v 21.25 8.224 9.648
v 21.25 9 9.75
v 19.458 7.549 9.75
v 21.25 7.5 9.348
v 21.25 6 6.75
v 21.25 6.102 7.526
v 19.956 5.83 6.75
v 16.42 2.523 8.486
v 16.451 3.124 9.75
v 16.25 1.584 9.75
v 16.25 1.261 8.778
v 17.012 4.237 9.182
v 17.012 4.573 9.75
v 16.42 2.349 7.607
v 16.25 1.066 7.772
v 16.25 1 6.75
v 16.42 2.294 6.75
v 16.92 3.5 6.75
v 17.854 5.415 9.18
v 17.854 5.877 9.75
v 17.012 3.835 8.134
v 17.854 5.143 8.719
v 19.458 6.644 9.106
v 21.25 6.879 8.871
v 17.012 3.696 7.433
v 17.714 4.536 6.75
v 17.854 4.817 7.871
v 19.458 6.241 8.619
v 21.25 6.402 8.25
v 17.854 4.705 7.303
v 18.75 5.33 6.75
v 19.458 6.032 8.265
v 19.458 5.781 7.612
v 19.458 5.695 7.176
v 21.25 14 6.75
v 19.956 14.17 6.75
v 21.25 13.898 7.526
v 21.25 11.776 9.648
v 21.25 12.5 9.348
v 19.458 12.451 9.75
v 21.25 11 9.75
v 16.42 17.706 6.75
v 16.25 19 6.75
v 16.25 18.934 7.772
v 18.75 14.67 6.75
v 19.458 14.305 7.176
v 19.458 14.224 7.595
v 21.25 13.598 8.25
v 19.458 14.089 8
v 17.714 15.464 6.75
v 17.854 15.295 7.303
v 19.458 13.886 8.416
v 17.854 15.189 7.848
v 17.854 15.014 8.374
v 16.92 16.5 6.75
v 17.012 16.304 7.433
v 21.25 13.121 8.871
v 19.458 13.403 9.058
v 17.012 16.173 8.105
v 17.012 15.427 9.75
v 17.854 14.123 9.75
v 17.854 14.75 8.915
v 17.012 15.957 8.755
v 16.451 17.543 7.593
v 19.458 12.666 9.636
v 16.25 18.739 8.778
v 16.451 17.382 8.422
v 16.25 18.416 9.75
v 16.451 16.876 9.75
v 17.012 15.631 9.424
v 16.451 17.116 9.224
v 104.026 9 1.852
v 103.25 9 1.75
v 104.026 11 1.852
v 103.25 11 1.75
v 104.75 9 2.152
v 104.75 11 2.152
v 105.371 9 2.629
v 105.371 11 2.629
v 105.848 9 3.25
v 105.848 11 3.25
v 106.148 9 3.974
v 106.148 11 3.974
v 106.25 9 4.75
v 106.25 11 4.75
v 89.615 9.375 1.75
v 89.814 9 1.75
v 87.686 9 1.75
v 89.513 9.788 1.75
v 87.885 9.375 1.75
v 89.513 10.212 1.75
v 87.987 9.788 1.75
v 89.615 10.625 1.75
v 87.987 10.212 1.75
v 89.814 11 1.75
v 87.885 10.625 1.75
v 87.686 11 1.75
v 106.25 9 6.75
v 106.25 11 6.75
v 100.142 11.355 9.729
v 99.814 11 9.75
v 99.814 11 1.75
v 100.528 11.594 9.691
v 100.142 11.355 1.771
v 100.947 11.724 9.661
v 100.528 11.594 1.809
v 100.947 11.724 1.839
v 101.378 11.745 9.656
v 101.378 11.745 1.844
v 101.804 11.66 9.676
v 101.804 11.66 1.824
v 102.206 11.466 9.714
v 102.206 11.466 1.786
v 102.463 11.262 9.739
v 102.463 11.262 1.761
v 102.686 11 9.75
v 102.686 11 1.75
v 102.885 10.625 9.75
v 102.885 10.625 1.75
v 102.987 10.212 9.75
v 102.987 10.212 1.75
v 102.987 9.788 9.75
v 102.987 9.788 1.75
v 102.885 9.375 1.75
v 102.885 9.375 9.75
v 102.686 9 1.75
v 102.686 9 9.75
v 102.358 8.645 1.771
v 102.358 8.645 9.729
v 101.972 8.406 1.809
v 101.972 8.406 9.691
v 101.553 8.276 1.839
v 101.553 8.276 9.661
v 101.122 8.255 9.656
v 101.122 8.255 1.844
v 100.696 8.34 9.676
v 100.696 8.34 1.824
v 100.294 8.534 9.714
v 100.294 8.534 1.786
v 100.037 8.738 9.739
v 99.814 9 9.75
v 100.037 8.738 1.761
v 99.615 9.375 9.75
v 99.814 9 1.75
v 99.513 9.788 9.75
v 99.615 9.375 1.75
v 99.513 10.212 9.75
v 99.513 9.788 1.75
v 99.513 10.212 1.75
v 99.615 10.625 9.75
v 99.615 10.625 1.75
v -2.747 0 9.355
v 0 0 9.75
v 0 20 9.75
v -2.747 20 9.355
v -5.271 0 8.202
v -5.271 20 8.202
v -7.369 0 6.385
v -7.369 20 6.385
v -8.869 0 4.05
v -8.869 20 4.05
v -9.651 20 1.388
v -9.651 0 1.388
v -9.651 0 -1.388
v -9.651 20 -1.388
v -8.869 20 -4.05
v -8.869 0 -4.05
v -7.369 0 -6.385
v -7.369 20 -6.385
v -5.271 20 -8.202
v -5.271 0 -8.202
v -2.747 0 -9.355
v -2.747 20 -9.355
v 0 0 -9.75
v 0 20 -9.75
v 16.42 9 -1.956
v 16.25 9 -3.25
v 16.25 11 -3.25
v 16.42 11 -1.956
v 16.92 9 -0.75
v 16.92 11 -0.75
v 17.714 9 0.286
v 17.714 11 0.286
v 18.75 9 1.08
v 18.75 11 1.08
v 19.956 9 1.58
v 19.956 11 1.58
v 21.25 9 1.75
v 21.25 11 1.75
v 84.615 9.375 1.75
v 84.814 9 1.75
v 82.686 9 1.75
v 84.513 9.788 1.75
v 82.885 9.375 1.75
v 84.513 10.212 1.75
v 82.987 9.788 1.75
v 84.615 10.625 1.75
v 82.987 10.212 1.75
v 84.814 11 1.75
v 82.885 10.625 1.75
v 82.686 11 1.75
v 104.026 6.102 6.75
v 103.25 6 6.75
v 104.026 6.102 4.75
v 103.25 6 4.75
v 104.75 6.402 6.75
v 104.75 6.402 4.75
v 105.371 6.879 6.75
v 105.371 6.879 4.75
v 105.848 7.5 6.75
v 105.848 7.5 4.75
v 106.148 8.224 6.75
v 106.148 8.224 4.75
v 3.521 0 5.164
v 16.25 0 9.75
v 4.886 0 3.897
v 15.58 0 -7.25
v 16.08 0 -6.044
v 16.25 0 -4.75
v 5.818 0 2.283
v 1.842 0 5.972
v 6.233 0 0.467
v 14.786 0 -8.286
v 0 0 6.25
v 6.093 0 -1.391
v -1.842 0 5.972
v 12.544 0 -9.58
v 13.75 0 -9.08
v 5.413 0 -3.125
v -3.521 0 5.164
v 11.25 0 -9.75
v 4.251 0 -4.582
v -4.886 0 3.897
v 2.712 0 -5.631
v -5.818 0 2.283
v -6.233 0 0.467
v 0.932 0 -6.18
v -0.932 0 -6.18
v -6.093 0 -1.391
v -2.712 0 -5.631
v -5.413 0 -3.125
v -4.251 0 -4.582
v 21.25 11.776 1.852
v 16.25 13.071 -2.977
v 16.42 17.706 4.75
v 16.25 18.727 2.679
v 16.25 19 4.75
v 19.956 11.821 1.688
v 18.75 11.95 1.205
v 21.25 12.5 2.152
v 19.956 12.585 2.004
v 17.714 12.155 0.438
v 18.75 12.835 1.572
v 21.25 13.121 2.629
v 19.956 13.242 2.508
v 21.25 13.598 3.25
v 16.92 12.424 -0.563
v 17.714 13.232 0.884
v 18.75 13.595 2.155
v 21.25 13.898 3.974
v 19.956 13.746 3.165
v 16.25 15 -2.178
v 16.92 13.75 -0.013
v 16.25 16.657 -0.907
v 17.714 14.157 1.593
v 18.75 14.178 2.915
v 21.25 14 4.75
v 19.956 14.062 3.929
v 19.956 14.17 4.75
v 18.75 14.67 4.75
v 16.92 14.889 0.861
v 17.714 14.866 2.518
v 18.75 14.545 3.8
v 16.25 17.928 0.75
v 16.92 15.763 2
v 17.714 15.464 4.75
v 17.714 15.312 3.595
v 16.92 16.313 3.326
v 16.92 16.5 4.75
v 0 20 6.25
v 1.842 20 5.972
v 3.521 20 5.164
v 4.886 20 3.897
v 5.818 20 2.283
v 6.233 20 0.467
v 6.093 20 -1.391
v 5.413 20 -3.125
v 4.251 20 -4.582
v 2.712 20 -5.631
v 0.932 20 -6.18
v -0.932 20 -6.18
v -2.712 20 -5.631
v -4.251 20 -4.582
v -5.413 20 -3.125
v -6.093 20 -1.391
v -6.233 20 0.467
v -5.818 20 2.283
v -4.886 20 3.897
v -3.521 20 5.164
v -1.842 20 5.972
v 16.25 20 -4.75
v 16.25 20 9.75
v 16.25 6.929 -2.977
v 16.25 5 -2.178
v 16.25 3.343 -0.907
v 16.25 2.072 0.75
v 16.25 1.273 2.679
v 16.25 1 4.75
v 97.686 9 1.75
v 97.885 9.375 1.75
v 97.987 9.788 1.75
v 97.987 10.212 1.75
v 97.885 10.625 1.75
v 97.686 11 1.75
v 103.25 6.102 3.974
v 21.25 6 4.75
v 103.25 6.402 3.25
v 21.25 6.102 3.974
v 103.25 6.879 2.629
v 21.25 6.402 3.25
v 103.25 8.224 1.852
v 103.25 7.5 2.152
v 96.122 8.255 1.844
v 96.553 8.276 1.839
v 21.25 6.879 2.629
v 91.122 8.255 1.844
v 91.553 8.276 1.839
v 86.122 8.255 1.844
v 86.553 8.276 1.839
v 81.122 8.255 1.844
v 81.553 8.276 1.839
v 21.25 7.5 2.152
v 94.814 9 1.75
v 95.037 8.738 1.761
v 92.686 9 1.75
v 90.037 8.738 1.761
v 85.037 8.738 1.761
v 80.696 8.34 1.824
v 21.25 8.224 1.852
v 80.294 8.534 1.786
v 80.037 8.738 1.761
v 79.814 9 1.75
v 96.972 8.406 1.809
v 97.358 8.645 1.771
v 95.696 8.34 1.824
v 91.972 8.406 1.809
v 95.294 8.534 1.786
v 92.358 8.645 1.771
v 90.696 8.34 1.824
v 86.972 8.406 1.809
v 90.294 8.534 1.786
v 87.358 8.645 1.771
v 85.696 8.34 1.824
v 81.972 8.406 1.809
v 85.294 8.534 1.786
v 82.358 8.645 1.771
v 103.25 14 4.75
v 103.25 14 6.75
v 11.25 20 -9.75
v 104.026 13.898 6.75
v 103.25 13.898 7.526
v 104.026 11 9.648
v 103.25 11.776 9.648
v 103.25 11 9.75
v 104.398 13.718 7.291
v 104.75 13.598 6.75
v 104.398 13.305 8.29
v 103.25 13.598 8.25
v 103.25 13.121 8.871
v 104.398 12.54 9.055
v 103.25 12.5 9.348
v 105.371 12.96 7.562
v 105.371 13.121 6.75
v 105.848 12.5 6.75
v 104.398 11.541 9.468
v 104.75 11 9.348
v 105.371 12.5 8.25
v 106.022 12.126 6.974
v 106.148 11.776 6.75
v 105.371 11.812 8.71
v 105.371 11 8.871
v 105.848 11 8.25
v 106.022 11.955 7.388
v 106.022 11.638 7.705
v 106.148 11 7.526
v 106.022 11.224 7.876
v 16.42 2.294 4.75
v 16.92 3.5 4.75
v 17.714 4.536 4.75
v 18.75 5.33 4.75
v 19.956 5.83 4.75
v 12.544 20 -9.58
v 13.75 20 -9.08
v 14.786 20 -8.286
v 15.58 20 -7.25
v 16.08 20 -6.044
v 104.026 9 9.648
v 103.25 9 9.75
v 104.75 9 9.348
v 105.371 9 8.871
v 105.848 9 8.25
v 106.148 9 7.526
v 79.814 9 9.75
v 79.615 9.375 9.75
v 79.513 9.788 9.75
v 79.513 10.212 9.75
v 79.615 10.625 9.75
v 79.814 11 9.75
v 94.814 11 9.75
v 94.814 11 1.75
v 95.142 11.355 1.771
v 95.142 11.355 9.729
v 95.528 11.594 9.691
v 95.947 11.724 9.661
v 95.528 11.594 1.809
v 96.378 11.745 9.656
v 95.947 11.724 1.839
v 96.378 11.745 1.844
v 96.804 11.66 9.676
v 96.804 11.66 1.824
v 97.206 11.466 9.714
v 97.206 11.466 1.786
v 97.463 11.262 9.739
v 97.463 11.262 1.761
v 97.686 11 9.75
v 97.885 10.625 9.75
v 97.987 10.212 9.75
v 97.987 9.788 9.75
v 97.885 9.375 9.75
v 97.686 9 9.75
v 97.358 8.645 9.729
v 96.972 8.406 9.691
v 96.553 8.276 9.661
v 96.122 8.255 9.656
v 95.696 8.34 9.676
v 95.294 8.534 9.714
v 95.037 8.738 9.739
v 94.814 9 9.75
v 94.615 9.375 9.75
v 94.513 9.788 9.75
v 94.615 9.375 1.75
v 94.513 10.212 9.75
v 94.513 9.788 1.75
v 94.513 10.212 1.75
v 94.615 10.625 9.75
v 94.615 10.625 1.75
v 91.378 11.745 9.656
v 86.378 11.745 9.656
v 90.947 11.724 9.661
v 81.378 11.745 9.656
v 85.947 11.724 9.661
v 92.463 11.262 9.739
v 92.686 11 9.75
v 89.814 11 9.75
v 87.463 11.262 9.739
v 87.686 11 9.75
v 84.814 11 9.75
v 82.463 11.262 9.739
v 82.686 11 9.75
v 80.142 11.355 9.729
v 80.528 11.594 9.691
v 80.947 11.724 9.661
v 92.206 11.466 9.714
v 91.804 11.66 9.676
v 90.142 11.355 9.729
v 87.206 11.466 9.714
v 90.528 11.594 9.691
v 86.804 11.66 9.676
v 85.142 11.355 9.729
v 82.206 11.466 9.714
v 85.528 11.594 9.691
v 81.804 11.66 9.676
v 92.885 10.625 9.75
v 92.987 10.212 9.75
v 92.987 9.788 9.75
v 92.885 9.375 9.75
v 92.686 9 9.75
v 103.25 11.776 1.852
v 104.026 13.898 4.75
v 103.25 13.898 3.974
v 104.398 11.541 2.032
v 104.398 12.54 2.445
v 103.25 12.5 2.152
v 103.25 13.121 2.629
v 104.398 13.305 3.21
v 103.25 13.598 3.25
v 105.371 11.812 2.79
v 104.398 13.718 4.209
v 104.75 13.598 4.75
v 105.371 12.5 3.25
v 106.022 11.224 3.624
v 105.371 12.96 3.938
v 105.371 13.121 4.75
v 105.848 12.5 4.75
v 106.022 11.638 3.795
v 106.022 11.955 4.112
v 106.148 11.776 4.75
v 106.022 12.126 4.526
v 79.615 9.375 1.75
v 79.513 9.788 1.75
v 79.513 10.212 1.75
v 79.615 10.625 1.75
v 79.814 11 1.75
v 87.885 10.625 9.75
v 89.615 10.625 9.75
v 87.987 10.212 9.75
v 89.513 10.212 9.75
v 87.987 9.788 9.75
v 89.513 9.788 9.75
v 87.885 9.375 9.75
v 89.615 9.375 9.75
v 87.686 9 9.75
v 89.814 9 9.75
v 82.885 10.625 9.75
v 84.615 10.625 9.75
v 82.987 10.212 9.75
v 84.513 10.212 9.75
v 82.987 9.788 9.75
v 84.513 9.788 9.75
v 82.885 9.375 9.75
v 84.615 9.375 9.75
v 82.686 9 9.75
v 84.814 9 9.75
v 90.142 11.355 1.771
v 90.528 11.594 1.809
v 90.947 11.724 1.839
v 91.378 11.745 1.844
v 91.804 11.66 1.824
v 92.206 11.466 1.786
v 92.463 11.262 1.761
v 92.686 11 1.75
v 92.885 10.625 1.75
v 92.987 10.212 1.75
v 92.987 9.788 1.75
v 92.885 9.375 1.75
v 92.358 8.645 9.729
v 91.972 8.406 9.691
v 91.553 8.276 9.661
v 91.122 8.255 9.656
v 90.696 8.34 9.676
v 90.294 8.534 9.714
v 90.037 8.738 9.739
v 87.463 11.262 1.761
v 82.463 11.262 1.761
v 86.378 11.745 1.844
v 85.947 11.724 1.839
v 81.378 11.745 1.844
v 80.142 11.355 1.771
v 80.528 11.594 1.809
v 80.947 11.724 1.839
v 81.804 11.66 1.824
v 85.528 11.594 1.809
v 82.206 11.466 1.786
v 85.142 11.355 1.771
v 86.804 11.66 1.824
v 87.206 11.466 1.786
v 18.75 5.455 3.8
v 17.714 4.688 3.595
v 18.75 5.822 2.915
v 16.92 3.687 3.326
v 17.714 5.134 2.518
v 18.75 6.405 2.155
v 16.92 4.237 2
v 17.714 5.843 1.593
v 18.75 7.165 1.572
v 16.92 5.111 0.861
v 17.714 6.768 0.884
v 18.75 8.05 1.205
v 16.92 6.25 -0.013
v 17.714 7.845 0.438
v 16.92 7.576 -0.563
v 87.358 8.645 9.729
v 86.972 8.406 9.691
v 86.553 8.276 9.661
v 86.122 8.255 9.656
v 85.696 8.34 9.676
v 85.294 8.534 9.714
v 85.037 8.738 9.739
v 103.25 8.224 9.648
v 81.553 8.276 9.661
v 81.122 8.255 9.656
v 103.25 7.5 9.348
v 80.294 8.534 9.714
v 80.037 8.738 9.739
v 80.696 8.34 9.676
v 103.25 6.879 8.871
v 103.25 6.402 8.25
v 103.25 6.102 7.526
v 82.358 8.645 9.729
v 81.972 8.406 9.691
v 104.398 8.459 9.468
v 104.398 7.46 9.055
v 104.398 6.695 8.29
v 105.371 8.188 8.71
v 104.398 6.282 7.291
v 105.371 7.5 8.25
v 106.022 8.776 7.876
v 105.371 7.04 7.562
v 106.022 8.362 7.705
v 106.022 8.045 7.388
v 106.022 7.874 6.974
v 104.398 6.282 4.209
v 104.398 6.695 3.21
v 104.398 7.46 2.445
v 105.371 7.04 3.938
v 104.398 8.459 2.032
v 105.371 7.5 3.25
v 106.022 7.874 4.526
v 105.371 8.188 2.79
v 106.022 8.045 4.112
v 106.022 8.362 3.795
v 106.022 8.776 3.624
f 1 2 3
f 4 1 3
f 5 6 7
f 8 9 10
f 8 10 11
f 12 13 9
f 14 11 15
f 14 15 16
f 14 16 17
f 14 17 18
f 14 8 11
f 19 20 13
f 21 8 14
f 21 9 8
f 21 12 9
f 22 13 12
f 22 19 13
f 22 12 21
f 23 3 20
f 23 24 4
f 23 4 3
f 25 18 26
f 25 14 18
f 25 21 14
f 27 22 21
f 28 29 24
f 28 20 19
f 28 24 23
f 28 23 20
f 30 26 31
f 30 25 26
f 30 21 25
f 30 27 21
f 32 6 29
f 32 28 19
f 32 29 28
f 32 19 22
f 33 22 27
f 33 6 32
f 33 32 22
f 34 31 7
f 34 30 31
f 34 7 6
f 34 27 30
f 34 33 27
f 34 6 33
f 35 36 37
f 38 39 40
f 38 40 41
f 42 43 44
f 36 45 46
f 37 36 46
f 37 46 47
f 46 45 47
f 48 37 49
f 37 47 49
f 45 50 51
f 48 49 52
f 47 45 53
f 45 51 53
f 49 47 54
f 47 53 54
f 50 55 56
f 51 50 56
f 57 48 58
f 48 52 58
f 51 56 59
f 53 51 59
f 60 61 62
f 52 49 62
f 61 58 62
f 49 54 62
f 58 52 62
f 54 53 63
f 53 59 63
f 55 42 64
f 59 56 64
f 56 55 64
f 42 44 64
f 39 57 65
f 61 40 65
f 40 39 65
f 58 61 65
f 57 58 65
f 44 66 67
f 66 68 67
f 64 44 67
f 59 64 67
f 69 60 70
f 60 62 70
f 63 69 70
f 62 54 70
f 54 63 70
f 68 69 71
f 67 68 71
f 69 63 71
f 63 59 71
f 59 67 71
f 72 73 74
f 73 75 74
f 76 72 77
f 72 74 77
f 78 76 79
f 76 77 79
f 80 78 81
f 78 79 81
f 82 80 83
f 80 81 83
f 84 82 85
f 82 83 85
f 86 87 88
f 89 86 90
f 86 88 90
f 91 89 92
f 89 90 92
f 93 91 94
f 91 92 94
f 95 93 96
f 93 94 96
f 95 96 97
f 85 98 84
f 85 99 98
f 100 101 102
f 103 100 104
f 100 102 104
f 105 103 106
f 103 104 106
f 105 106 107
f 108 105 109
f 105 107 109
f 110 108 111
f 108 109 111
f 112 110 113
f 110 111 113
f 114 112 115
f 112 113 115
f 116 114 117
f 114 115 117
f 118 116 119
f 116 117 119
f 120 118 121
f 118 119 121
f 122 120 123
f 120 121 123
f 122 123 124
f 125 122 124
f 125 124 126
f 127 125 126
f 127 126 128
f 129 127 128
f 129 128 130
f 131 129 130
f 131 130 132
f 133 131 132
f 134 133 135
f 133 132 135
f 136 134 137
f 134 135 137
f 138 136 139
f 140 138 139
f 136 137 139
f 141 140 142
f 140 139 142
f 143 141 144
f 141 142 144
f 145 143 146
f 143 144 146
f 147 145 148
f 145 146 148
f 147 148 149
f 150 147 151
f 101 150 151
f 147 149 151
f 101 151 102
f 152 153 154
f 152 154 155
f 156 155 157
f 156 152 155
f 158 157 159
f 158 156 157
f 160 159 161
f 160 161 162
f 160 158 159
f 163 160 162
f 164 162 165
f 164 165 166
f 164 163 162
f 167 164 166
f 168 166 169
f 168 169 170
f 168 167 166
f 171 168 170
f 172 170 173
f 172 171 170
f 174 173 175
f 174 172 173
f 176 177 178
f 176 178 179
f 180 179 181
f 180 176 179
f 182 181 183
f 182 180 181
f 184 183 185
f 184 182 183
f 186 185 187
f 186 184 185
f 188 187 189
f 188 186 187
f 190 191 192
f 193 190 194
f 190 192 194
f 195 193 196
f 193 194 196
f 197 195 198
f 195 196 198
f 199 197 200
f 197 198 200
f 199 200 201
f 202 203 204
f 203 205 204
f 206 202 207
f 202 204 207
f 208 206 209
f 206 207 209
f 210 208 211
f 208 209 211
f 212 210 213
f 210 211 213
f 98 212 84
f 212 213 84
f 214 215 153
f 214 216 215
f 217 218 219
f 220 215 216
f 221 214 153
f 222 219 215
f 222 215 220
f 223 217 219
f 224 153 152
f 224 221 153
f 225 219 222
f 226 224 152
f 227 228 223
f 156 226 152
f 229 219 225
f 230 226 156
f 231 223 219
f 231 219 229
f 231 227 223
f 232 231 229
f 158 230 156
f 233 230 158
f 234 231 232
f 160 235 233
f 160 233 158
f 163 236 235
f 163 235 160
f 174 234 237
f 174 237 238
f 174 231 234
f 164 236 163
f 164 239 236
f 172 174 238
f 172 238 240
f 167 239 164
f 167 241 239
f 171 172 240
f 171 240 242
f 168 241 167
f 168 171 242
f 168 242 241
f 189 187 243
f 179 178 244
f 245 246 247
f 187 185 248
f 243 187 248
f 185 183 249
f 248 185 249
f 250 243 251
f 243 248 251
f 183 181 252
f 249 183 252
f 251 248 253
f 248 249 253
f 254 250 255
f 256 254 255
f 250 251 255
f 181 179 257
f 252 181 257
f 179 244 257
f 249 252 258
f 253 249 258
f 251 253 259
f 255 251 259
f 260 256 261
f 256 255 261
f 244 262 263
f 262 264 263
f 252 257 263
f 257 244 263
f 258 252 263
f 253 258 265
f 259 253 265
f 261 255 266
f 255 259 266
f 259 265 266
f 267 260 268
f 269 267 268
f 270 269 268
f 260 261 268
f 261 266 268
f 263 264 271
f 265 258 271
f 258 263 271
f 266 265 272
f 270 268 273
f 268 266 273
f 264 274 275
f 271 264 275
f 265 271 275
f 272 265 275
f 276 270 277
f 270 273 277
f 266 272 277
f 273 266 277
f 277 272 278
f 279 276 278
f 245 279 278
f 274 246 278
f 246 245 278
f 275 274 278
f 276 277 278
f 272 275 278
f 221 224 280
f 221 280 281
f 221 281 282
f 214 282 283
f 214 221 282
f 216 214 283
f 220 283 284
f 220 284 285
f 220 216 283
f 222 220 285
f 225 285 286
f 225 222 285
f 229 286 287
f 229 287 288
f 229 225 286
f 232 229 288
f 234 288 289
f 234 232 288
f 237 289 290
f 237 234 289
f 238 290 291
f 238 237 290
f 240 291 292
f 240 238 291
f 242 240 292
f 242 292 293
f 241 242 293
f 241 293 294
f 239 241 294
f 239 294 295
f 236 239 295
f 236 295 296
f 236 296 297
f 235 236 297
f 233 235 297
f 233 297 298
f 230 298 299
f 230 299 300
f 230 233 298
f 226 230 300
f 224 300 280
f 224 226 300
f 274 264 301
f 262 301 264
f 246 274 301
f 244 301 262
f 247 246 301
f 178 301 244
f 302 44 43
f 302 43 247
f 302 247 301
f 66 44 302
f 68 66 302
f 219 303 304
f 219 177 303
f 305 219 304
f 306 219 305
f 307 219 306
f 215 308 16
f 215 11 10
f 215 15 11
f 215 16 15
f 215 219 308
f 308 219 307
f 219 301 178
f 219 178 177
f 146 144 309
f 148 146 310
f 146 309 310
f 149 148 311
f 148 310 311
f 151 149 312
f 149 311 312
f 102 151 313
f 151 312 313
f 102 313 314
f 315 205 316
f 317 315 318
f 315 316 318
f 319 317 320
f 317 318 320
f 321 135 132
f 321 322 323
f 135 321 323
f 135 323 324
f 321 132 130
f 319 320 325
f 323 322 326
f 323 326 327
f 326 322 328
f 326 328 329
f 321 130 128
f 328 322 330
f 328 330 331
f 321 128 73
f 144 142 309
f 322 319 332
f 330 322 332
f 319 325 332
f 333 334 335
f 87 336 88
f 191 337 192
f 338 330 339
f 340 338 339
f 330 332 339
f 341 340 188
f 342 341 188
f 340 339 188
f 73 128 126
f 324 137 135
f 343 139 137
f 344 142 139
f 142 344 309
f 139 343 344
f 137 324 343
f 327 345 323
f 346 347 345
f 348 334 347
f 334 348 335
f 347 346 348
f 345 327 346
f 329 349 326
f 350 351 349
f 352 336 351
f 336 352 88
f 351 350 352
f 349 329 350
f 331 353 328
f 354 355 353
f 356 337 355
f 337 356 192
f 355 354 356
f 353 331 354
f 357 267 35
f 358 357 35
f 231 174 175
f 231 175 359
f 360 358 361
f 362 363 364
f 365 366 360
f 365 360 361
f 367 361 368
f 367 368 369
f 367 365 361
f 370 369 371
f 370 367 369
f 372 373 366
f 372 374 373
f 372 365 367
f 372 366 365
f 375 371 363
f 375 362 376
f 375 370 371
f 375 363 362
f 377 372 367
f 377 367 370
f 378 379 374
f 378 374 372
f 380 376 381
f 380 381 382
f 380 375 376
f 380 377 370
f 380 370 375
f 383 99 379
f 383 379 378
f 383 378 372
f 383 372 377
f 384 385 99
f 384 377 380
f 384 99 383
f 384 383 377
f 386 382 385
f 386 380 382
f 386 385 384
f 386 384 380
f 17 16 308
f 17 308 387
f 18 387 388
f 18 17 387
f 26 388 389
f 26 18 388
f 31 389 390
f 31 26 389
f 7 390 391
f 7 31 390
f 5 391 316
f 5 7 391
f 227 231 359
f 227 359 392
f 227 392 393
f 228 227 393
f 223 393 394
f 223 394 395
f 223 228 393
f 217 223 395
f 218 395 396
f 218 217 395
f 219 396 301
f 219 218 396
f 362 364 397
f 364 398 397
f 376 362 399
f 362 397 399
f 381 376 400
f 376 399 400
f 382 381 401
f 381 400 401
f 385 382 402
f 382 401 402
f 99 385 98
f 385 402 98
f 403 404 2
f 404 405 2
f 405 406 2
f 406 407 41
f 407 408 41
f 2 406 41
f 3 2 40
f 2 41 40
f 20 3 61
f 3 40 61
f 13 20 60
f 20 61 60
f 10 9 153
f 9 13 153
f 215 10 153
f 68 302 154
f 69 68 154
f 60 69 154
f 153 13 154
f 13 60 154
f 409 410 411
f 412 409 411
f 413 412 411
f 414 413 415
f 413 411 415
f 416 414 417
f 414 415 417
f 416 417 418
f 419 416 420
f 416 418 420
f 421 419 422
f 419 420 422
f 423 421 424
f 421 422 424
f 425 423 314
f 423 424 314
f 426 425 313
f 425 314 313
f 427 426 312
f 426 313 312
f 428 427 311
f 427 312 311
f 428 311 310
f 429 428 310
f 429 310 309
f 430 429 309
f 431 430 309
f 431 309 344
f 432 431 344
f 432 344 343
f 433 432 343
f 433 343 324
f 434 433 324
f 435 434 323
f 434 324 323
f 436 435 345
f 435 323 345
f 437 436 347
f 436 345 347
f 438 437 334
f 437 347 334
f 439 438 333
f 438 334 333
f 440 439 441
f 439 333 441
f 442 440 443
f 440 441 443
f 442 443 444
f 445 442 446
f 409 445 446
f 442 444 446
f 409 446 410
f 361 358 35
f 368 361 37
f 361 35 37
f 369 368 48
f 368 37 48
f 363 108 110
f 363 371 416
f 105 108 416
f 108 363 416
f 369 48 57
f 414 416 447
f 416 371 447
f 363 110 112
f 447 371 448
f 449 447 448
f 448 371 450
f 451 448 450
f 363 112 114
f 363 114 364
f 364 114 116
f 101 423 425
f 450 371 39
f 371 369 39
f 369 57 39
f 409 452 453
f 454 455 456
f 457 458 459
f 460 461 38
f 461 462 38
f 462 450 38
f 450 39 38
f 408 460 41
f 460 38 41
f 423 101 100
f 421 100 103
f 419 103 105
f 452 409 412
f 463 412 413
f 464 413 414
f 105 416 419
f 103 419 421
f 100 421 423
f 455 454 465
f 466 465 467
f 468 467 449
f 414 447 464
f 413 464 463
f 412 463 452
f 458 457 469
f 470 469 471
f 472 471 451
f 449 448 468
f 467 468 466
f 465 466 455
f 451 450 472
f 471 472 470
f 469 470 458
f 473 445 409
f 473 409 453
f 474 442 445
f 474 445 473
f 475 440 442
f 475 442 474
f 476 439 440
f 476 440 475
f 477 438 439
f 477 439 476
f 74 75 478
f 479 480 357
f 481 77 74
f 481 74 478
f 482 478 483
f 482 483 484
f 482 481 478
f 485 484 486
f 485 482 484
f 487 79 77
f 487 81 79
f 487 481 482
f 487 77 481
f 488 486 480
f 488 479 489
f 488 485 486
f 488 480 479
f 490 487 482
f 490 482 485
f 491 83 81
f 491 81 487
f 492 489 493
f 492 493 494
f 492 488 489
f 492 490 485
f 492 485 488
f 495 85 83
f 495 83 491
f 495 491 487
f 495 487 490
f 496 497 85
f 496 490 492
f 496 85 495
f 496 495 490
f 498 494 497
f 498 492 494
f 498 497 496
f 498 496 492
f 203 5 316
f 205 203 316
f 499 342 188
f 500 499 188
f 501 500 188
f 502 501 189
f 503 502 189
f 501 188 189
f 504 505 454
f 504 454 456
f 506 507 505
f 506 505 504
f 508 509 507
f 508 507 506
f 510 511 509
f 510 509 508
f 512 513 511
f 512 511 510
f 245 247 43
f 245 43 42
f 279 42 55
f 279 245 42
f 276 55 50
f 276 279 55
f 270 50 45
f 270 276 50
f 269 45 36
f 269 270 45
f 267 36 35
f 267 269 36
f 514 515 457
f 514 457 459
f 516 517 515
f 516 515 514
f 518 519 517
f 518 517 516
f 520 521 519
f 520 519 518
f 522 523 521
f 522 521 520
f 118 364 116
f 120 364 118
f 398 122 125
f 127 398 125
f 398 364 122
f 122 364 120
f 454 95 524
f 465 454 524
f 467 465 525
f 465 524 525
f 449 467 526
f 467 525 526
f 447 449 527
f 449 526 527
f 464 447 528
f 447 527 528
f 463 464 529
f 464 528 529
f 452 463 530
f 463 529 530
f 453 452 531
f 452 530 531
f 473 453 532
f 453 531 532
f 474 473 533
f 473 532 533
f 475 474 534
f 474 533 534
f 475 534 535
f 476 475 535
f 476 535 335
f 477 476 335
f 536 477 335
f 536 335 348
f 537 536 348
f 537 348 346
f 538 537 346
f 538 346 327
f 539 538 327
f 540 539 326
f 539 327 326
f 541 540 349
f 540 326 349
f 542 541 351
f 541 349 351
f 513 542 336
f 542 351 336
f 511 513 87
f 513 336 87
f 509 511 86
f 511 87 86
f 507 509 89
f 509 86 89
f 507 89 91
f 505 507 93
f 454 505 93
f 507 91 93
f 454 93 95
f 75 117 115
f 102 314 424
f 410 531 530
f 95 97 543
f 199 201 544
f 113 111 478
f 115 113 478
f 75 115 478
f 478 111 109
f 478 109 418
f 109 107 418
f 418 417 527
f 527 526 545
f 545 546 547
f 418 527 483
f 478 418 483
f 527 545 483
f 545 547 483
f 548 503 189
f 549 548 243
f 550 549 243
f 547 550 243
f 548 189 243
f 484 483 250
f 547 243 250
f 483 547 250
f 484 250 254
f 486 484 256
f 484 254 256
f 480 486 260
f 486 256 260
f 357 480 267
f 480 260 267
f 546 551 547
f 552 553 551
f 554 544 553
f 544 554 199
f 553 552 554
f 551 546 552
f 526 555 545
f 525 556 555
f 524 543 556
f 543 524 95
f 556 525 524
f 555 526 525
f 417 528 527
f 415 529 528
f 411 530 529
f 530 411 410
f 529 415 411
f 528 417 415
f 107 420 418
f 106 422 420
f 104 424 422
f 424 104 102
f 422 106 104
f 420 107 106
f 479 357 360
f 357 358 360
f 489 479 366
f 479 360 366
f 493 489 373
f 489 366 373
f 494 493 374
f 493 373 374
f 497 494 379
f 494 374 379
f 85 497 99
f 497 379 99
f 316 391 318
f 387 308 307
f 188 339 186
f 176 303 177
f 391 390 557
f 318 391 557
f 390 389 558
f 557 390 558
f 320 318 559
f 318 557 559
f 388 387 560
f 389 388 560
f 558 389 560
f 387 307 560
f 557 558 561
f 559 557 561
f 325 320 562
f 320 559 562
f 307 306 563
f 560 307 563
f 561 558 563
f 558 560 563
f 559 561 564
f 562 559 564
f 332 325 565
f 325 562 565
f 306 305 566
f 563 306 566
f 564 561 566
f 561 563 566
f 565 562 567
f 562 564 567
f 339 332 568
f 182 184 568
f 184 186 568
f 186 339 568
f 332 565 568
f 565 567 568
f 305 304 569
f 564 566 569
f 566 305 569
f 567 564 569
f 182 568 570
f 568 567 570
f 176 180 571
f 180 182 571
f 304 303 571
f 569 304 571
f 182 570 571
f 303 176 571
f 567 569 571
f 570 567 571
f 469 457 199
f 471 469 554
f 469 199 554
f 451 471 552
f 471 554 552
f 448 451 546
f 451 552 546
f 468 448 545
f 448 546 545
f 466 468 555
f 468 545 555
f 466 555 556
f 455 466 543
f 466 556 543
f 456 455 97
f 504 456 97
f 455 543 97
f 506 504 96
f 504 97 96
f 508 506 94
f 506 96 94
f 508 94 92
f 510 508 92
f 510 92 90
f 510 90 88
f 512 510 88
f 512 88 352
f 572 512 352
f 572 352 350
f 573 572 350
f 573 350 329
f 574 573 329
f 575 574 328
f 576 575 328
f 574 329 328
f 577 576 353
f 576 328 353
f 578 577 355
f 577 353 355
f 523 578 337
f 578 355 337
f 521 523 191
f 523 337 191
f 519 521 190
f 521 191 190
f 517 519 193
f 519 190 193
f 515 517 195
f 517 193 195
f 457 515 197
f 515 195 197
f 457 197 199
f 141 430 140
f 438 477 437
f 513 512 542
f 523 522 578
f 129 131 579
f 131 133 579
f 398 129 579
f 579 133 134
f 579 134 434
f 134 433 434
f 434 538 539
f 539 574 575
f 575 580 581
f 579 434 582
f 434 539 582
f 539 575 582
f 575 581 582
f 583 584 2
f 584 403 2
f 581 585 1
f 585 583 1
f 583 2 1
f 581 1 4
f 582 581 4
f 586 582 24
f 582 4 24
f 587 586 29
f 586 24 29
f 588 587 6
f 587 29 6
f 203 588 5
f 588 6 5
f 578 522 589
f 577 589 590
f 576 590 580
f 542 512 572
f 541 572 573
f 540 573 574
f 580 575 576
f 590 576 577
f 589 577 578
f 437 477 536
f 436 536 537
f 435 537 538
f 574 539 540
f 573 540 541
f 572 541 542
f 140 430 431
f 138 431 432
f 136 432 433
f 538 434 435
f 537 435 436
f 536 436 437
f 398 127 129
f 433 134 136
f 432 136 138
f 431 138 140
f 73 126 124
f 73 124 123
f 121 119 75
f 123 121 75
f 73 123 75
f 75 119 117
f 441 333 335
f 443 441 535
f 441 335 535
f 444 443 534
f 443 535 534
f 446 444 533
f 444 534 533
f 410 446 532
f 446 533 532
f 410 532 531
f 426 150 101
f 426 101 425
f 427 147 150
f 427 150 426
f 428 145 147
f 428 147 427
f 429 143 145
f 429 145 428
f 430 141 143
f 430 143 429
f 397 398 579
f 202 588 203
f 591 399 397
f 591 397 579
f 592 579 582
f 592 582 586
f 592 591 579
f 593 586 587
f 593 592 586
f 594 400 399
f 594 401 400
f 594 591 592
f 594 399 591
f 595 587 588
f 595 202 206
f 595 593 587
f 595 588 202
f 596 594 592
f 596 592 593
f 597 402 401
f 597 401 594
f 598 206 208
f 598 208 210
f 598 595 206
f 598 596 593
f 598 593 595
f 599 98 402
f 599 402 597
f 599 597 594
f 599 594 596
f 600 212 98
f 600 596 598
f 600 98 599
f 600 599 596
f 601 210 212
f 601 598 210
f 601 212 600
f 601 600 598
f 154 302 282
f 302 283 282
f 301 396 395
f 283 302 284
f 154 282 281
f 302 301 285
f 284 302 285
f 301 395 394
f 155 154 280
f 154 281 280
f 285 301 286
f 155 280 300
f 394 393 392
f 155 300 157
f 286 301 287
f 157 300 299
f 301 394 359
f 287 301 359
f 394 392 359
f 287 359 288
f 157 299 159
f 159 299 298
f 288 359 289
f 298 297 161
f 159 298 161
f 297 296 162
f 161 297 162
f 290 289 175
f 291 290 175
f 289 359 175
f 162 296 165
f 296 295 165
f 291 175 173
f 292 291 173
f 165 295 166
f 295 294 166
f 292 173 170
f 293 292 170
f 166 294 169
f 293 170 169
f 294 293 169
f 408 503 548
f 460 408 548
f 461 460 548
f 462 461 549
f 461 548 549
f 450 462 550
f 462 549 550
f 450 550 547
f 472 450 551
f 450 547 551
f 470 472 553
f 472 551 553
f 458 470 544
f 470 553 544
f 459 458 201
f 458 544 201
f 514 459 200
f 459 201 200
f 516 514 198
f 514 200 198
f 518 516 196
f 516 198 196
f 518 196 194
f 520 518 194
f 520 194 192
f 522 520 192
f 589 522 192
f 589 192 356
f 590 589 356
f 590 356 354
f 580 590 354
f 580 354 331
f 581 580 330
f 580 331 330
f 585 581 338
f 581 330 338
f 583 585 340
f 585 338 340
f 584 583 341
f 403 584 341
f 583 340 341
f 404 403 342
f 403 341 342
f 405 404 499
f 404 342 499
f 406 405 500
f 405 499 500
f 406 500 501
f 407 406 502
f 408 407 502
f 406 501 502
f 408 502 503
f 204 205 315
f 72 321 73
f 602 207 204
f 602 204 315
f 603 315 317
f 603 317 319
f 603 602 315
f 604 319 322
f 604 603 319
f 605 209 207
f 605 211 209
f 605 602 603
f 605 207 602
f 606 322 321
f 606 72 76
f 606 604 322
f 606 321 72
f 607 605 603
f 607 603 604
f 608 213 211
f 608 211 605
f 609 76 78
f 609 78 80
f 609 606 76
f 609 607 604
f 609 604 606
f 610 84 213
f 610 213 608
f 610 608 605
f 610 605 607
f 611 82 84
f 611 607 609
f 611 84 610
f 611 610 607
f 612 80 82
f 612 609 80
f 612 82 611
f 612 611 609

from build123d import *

# Parameters (mm, degrees)
SKETCH1_R           = 6.25
BOSS_EXTRUDE1_DEPTH = 20
BOSS_EXTRUDE2_DEPTH = 90
SKETCH3_R           = 1.75
CUT_EXTRUDE1_DEPTH  = 109.72585939
FILLET1_R           = 3
FILLET2_R           = 5


with BuildPart() as part:
    # Sketch1 → Boss-Extrude1 (new body)
    with BuildSketch(Plane(origin=(0, 0, 0), x_dir=(1, 0, 0), z_dir=(0, 1, 0))):
        with BuildLine():
            Line((0, 9.75), (11.25, 9.75))
            ThreePointArc((11.25, 9.75), (14.785533906, 8.285533906), (16.25, 4.75))
            Line((16.25, 4.75), (16.25, -9.75))
            Line((16.25, -9.75), (0, -9.75))
            ThreePointArc((0, -9.75), (-9.75, 0), (0, 9.75))
        make_face()
        with Locations(Location((0, 0, 0), (0, 0, 270))):
            Circle(SKETCH1_R, mode=Mode.SUBTRACT)
    extrude(amount=BOSS_EXTRUDE1_DEPTH)

    # Sketch2 → Boss-Extrude2 (add)
    with BuildSketch(Plane(origin=(16.25, 0, 0), x_dir=(0, 0, -1), z_dir=(1, 0, 0))):
        with BuildLine():
            Line((-6.75, 6), (-4.75, 6))
            ThreePointArc((-4.75, 6), (-2.628679656, 6.878679656), (-1.75, 9))
            Line((-1.75, 9), (-1.75, 11))
            ThreePointArc((-1.75, 11), (-2.628679656, 13.121320344), (-4.75, 14))
            Line((-4.75, 14), (-6.75, 14))
            ThreePointArc((-6.75, 14), (-8.871320344, 13.121320344), (-9.75, 11))
            Line((-9.75, 11), (-9.75, 9))
            ThreePointArc((-9.75, 9), (-8.871320344, 6.878679656), (-6.75, 6))
        make_face()
    extrude(amount=BOSS_EXTRUDE2_DEPTH)

    # Sketch3 → Cut-Extrude1 (cut, through all)
    with BuildSketch(Plane(origin=(0, 0, 1.75), x_dir=(-1, 0, 0), z_dir=(0, 0, -1))):
        with Locations(Location((-101.25, 10, 0), (0, 0, 34.849904579))):
            Circle(SKETCH3_R)
        with Locations(Location((-96.25, 10, 0), (0, 0, 34.849904579))):
            Circle(SKETCH3_R)
        with Locations(Location((-91.25, 10, 0), (0, 0, 34.849904579))):
            Circle(SKETCH3_R)
        with Locations(Location((-86.25, 10, 0), (0, 0, 34.849904579))):
            Circle(SKETCH3_R)
        with Locations(Location((-81.25, 10, 0), (0, 0, 34.849904579))):
            Circle(SKETCH3_R)
    extrude(amount=-CUT_EXTRUDE1_DEPTH, mode=Mode.SUBTRACT)

    # Fillet1
    fillet1_edges = [part.edges().sort_by_distance(p)[0] for p in [
        (106.25, 6.878679656, 8.871320344),
        (106.25, 6, 5.75),
        (106.25, 6.878679656, 2.628679656),
        (106.25, 10, 1.75),
        (106.25, 13.121320344, 2.628679656),
        (106.25, 14, 5.75),
        (106.25, 13.121320344, 8.871320344),
        (106.25, 10, 9.75),
    ]]
    fillet(fillet1_edges, radius=FILLET1_R)

    # Fillet2
    # the kernel refuses this fillet: 5 mm, written as the material it adds along each edge
    with BuildSketch(Plane(origin=(16.25, 9, 6.75), x_dir=(1.1842378929335002e-15, -0.8556201630305047, -0.5176042277799251), z_dir=(0, -0.5176042277799251, 0.8556201630305047))) as fillet2_piece_1_section:
        with BuildLine():
            CenterArc((-3 - FILLET2_R, FILLET2_R), FILLET2_R, 270, 90)
            Line((-3, FILLET2_R), (-3, 0))
            Line((-3, 0), (-3 - FILLET2_R, 0))
        make_face()
    fillet2_piece_1 = revolve(axis=Axis((16.25, 9, 6.75), (1, 0, 0)), revolution_arc=328.828315396, mode=Mode.PRIVATE)
    fillet2_piece_1 = split(fillet2_piece_1, bisect_by=Plane(origin=(16.92449451, 12.664519723, 9.75), z_dir=(0, 0, -1)), keep=Keep.TOP, mode=Mode.PRIVATE)
    add(fillet2_piece_1)
    with BuildSketch(Plane(origin=(16.25, 6, 6.75), x_dir=(0, -1, 0), z_dir=(0, 0, -1)), Plane(origin=(16.25, 9, 1.75), x_dir=(0, 0, -1), z_dir=(0, 1, 0))) as fillet2_piece_2:
        with BuildLine():
            CenterArc((FILLET2_R, -FILLET2_R), FILLET2_R, 90, 90)
            Line((0, -FILLET2_R), (0, 0))
            Line((0, 0), (FILLET2_R, 0))
        make_face()
    extrude(amount=2)
    with BuildSketch(Plane(origin=(16.25, 9, 4.75), x_dir=(0, -1, 0), z_dir=(0, 0, 1))) as fillet2_piece_3:
        with BuildLine():
            CenterArc((3 + FILLET2_R, FILLET2_R), FILLET2_R, 180, 90)
            Line((3, FILLET2_R), (3, 0))
            Line((3, 0), (3 + FILLET2_R, 0))
        make_face()
    revolve(axis=Axis((16.25, 9, 4.75), (1, 0, 0)), revolution_arc=90)
    with BuildSketch(Plane(origin=(16.25, 11, 4.75), x_dir=(0, 0, -1), z_dir=(0, -1, 0))) as fillet2_piece_4:
        with BuildLine():
            CenterArc((3 + FILLET2_R, FILLET2_R), FILLET2_R, 180, 90)
            Line((3, FILLET2_R), (3, 0))
            Line((3, 0), (3 + FILLET2_R, 0))
        make_face()
    revolve(axis=Axis((16.25, 11, 4.75), (1, 0, 0)), revolution_arc=90)
    with BuildSketch(Plane(origin=(16.25, 14, 4.75), x_dir=(1, 0, 0), z_dir=(0, 0, 1))) as fillet2_piece_5:
        with BuildLine():
            CenterArc((FILLET2_R, FILLET2_R), FILLET2_R, 180, 90)
            Line((0, FILLET2_R), (0, 0))
            Line((0, 0), (FILLET2_R, 0))
        make_face()
    extrude(amount=2)
    with BuildSketch(Plane(origin=(16.25, 11, 6.75), x_dir=(0, 1, 0), z_dir=(0, 0, -1))) as fillet2_piece_6_section:
        with BuildLine():
            CenterArc((3 + FILLET2_R, FILLET2_R), FILLET2_R, 180, 90)
            Line((3 + FILLET2_R, 0), (3, 0))
            Line((3, 0), (3, FILLET2_R))
        make_face()
    fillet2_piece_6 = revolve(axis=Axis((16.25, 11, 6.75), (1, 0, 0)), revolution_arc=328.828315396, mode=Mode.PRIVATE)
    fillet2_piece_6 = split(fillet2_piece_6, bisect_by=Plane(origin=(17.971658099, 13.274254424, 9.75), z_dir=(0, 0, -1)), keep=Keep.TOP, mode=Mode.PRIVATE)
    add(fillet2_piece_6)


solid = part.part
